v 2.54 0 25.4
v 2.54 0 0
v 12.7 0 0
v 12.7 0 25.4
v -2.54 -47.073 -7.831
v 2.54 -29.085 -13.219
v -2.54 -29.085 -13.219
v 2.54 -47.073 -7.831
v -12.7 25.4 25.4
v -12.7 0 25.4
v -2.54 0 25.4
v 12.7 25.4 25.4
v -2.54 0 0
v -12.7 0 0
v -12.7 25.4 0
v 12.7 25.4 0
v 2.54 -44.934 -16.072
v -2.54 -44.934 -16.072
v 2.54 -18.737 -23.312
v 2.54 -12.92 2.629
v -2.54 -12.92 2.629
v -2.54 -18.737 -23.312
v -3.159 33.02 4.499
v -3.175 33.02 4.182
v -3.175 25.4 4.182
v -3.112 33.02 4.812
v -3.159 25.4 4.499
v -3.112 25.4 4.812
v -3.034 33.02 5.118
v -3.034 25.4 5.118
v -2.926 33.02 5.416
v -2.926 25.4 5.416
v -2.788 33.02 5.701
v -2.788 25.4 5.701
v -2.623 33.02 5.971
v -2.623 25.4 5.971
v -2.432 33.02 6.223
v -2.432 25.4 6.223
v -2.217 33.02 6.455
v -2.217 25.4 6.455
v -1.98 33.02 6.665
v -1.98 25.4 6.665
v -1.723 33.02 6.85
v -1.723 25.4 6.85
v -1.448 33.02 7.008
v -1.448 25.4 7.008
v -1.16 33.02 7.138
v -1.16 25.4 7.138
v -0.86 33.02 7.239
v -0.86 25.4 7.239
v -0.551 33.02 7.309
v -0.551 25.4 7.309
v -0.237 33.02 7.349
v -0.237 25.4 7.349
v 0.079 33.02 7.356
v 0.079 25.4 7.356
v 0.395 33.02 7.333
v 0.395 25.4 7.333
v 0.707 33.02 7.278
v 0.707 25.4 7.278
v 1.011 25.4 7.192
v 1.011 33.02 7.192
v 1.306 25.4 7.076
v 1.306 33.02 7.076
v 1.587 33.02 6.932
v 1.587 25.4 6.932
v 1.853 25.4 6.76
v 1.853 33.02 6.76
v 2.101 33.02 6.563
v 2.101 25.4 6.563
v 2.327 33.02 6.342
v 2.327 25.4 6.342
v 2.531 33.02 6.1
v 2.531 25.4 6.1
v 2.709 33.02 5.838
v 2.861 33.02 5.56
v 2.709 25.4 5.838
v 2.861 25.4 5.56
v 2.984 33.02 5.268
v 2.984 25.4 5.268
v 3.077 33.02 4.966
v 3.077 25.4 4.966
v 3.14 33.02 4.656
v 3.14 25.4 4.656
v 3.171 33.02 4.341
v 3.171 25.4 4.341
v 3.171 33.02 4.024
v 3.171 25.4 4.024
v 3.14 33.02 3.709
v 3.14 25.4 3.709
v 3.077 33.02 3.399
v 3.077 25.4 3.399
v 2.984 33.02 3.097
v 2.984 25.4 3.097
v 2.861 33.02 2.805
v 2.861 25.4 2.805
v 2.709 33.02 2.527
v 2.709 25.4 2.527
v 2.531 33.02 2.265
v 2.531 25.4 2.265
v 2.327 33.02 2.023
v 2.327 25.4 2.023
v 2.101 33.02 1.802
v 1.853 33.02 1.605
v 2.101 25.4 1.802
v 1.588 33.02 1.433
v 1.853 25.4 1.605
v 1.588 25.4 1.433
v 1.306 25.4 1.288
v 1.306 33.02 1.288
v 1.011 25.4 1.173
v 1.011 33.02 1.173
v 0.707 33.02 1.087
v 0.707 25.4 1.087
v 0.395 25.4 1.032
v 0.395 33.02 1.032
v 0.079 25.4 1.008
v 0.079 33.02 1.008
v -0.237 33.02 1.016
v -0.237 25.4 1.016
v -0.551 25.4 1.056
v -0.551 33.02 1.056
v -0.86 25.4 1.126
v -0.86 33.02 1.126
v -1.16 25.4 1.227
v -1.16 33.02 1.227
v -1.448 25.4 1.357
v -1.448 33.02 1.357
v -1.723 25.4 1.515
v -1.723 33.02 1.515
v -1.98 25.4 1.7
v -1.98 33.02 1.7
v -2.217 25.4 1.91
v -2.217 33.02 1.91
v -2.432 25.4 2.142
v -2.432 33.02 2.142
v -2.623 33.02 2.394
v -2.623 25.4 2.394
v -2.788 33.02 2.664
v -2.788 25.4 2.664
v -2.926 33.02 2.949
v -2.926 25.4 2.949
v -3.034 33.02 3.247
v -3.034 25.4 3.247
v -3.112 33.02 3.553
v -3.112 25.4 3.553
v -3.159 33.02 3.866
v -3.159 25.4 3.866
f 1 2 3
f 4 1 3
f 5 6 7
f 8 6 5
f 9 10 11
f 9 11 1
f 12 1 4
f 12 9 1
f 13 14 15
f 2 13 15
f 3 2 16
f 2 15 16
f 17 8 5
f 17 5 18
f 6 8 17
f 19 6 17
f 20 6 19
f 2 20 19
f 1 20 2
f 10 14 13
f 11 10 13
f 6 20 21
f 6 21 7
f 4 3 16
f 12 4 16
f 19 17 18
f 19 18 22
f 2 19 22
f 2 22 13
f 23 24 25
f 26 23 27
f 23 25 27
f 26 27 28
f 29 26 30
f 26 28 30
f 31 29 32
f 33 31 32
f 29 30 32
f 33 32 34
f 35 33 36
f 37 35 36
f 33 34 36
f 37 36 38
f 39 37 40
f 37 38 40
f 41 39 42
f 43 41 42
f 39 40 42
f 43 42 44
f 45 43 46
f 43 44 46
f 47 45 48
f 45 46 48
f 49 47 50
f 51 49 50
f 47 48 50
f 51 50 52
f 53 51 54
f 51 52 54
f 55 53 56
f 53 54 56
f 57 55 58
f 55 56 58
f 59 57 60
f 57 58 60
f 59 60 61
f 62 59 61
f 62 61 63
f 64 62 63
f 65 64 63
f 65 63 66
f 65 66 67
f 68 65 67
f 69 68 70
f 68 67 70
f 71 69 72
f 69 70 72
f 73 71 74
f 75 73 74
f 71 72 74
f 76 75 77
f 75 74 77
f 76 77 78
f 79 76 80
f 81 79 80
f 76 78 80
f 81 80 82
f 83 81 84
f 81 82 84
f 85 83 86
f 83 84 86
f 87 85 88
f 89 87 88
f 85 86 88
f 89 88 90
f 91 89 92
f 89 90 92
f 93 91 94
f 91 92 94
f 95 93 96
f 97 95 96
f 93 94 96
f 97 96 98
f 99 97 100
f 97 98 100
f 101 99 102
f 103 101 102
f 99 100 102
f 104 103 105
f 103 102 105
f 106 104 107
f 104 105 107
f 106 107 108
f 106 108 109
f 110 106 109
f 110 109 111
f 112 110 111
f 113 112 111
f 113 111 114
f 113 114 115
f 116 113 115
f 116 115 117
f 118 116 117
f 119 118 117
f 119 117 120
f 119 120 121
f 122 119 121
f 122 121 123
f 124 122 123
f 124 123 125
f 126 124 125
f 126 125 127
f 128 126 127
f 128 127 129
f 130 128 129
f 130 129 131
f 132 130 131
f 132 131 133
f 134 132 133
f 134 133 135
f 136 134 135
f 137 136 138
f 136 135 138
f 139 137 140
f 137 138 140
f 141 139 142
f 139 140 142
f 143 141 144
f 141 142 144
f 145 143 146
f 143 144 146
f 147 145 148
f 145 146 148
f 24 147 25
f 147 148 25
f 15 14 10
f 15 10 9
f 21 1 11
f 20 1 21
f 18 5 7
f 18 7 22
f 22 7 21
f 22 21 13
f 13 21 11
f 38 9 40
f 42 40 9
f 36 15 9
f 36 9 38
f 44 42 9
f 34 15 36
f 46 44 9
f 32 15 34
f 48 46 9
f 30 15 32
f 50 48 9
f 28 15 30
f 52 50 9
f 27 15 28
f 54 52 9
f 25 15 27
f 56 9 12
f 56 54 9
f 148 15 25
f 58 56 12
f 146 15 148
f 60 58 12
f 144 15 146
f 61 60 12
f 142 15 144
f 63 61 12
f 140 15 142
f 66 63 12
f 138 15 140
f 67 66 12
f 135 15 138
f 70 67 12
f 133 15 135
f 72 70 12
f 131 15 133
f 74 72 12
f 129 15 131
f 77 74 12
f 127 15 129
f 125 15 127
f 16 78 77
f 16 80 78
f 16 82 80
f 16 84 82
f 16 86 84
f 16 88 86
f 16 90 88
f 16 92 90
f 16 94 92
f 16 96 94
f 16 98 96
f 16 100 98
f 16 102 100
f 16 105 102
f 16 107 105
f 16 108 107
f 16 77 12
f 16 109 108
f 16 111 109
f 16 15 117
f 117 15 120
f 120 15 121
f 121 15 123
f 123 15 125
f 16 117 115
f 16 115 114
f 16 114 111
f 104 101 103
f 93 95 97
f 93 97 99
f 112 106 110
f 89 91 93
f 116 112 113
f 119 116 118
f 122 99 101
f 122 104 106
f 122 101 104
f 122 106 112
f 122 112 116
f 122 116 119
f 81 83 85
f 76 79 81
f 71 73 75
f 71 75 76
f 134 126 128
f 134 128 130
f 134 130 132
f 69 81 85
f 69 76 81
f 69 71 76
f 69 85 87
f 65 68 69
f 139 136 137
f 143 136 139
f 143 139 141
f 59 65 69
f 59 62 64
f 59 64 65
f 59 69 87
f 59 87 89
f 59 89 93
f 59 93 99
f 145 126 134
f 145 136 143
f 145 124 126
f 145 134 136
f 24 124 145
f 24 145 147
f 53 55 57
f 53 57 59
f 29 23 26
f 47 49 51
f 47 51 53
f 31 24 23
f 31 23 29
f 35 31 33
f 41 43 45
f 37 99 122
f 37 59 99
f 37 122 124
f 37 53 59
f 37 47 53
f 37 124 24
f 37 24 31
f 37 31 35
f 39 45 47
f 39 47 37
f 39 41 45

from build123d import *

# Parameters (mm, degrees)
F0_W     = 25.4
F0_H     = 25.4
F1_DEPTH = 25.4
F4_DEPTH = 5.08
F5_R     = 3.175
F6_DEPTH = 7.62


with BuildPart() as f1:
    # F0 (on Top) → F1 (new body)
    with BuildSketch(Plane.XY):
        with Locations((0, 12.7)):
            Rectangle(F0_W, F0_H)
    extrude(amount=F1_DEPTH)

    # F3 (on offset) → F4 (join)
    with BuildSketch(Plane.YZ.offset(2.54)):
        Polygon((-18.736662, -23.311928), (0, 0), (0, 25.4), (-12.919935, 2.629027), (-29.085293, -13.219362), (-47.073215, -7.830909), (-44.933684, -16.072072), align=None)
    extrude(amount=-F4_DEPTH)

    # F5 (on face) → F6 (join)
    with BuildSketch(Plane(origin=(0, 25.4, 0), x_dir=(-1, 0, 0), z_dir=(0, 1, 0))):
        with Locations((0, 4.182435)):
            Circle(F5_R)
    extrude(amount=F6_DEPTH)


solid = f1.part
